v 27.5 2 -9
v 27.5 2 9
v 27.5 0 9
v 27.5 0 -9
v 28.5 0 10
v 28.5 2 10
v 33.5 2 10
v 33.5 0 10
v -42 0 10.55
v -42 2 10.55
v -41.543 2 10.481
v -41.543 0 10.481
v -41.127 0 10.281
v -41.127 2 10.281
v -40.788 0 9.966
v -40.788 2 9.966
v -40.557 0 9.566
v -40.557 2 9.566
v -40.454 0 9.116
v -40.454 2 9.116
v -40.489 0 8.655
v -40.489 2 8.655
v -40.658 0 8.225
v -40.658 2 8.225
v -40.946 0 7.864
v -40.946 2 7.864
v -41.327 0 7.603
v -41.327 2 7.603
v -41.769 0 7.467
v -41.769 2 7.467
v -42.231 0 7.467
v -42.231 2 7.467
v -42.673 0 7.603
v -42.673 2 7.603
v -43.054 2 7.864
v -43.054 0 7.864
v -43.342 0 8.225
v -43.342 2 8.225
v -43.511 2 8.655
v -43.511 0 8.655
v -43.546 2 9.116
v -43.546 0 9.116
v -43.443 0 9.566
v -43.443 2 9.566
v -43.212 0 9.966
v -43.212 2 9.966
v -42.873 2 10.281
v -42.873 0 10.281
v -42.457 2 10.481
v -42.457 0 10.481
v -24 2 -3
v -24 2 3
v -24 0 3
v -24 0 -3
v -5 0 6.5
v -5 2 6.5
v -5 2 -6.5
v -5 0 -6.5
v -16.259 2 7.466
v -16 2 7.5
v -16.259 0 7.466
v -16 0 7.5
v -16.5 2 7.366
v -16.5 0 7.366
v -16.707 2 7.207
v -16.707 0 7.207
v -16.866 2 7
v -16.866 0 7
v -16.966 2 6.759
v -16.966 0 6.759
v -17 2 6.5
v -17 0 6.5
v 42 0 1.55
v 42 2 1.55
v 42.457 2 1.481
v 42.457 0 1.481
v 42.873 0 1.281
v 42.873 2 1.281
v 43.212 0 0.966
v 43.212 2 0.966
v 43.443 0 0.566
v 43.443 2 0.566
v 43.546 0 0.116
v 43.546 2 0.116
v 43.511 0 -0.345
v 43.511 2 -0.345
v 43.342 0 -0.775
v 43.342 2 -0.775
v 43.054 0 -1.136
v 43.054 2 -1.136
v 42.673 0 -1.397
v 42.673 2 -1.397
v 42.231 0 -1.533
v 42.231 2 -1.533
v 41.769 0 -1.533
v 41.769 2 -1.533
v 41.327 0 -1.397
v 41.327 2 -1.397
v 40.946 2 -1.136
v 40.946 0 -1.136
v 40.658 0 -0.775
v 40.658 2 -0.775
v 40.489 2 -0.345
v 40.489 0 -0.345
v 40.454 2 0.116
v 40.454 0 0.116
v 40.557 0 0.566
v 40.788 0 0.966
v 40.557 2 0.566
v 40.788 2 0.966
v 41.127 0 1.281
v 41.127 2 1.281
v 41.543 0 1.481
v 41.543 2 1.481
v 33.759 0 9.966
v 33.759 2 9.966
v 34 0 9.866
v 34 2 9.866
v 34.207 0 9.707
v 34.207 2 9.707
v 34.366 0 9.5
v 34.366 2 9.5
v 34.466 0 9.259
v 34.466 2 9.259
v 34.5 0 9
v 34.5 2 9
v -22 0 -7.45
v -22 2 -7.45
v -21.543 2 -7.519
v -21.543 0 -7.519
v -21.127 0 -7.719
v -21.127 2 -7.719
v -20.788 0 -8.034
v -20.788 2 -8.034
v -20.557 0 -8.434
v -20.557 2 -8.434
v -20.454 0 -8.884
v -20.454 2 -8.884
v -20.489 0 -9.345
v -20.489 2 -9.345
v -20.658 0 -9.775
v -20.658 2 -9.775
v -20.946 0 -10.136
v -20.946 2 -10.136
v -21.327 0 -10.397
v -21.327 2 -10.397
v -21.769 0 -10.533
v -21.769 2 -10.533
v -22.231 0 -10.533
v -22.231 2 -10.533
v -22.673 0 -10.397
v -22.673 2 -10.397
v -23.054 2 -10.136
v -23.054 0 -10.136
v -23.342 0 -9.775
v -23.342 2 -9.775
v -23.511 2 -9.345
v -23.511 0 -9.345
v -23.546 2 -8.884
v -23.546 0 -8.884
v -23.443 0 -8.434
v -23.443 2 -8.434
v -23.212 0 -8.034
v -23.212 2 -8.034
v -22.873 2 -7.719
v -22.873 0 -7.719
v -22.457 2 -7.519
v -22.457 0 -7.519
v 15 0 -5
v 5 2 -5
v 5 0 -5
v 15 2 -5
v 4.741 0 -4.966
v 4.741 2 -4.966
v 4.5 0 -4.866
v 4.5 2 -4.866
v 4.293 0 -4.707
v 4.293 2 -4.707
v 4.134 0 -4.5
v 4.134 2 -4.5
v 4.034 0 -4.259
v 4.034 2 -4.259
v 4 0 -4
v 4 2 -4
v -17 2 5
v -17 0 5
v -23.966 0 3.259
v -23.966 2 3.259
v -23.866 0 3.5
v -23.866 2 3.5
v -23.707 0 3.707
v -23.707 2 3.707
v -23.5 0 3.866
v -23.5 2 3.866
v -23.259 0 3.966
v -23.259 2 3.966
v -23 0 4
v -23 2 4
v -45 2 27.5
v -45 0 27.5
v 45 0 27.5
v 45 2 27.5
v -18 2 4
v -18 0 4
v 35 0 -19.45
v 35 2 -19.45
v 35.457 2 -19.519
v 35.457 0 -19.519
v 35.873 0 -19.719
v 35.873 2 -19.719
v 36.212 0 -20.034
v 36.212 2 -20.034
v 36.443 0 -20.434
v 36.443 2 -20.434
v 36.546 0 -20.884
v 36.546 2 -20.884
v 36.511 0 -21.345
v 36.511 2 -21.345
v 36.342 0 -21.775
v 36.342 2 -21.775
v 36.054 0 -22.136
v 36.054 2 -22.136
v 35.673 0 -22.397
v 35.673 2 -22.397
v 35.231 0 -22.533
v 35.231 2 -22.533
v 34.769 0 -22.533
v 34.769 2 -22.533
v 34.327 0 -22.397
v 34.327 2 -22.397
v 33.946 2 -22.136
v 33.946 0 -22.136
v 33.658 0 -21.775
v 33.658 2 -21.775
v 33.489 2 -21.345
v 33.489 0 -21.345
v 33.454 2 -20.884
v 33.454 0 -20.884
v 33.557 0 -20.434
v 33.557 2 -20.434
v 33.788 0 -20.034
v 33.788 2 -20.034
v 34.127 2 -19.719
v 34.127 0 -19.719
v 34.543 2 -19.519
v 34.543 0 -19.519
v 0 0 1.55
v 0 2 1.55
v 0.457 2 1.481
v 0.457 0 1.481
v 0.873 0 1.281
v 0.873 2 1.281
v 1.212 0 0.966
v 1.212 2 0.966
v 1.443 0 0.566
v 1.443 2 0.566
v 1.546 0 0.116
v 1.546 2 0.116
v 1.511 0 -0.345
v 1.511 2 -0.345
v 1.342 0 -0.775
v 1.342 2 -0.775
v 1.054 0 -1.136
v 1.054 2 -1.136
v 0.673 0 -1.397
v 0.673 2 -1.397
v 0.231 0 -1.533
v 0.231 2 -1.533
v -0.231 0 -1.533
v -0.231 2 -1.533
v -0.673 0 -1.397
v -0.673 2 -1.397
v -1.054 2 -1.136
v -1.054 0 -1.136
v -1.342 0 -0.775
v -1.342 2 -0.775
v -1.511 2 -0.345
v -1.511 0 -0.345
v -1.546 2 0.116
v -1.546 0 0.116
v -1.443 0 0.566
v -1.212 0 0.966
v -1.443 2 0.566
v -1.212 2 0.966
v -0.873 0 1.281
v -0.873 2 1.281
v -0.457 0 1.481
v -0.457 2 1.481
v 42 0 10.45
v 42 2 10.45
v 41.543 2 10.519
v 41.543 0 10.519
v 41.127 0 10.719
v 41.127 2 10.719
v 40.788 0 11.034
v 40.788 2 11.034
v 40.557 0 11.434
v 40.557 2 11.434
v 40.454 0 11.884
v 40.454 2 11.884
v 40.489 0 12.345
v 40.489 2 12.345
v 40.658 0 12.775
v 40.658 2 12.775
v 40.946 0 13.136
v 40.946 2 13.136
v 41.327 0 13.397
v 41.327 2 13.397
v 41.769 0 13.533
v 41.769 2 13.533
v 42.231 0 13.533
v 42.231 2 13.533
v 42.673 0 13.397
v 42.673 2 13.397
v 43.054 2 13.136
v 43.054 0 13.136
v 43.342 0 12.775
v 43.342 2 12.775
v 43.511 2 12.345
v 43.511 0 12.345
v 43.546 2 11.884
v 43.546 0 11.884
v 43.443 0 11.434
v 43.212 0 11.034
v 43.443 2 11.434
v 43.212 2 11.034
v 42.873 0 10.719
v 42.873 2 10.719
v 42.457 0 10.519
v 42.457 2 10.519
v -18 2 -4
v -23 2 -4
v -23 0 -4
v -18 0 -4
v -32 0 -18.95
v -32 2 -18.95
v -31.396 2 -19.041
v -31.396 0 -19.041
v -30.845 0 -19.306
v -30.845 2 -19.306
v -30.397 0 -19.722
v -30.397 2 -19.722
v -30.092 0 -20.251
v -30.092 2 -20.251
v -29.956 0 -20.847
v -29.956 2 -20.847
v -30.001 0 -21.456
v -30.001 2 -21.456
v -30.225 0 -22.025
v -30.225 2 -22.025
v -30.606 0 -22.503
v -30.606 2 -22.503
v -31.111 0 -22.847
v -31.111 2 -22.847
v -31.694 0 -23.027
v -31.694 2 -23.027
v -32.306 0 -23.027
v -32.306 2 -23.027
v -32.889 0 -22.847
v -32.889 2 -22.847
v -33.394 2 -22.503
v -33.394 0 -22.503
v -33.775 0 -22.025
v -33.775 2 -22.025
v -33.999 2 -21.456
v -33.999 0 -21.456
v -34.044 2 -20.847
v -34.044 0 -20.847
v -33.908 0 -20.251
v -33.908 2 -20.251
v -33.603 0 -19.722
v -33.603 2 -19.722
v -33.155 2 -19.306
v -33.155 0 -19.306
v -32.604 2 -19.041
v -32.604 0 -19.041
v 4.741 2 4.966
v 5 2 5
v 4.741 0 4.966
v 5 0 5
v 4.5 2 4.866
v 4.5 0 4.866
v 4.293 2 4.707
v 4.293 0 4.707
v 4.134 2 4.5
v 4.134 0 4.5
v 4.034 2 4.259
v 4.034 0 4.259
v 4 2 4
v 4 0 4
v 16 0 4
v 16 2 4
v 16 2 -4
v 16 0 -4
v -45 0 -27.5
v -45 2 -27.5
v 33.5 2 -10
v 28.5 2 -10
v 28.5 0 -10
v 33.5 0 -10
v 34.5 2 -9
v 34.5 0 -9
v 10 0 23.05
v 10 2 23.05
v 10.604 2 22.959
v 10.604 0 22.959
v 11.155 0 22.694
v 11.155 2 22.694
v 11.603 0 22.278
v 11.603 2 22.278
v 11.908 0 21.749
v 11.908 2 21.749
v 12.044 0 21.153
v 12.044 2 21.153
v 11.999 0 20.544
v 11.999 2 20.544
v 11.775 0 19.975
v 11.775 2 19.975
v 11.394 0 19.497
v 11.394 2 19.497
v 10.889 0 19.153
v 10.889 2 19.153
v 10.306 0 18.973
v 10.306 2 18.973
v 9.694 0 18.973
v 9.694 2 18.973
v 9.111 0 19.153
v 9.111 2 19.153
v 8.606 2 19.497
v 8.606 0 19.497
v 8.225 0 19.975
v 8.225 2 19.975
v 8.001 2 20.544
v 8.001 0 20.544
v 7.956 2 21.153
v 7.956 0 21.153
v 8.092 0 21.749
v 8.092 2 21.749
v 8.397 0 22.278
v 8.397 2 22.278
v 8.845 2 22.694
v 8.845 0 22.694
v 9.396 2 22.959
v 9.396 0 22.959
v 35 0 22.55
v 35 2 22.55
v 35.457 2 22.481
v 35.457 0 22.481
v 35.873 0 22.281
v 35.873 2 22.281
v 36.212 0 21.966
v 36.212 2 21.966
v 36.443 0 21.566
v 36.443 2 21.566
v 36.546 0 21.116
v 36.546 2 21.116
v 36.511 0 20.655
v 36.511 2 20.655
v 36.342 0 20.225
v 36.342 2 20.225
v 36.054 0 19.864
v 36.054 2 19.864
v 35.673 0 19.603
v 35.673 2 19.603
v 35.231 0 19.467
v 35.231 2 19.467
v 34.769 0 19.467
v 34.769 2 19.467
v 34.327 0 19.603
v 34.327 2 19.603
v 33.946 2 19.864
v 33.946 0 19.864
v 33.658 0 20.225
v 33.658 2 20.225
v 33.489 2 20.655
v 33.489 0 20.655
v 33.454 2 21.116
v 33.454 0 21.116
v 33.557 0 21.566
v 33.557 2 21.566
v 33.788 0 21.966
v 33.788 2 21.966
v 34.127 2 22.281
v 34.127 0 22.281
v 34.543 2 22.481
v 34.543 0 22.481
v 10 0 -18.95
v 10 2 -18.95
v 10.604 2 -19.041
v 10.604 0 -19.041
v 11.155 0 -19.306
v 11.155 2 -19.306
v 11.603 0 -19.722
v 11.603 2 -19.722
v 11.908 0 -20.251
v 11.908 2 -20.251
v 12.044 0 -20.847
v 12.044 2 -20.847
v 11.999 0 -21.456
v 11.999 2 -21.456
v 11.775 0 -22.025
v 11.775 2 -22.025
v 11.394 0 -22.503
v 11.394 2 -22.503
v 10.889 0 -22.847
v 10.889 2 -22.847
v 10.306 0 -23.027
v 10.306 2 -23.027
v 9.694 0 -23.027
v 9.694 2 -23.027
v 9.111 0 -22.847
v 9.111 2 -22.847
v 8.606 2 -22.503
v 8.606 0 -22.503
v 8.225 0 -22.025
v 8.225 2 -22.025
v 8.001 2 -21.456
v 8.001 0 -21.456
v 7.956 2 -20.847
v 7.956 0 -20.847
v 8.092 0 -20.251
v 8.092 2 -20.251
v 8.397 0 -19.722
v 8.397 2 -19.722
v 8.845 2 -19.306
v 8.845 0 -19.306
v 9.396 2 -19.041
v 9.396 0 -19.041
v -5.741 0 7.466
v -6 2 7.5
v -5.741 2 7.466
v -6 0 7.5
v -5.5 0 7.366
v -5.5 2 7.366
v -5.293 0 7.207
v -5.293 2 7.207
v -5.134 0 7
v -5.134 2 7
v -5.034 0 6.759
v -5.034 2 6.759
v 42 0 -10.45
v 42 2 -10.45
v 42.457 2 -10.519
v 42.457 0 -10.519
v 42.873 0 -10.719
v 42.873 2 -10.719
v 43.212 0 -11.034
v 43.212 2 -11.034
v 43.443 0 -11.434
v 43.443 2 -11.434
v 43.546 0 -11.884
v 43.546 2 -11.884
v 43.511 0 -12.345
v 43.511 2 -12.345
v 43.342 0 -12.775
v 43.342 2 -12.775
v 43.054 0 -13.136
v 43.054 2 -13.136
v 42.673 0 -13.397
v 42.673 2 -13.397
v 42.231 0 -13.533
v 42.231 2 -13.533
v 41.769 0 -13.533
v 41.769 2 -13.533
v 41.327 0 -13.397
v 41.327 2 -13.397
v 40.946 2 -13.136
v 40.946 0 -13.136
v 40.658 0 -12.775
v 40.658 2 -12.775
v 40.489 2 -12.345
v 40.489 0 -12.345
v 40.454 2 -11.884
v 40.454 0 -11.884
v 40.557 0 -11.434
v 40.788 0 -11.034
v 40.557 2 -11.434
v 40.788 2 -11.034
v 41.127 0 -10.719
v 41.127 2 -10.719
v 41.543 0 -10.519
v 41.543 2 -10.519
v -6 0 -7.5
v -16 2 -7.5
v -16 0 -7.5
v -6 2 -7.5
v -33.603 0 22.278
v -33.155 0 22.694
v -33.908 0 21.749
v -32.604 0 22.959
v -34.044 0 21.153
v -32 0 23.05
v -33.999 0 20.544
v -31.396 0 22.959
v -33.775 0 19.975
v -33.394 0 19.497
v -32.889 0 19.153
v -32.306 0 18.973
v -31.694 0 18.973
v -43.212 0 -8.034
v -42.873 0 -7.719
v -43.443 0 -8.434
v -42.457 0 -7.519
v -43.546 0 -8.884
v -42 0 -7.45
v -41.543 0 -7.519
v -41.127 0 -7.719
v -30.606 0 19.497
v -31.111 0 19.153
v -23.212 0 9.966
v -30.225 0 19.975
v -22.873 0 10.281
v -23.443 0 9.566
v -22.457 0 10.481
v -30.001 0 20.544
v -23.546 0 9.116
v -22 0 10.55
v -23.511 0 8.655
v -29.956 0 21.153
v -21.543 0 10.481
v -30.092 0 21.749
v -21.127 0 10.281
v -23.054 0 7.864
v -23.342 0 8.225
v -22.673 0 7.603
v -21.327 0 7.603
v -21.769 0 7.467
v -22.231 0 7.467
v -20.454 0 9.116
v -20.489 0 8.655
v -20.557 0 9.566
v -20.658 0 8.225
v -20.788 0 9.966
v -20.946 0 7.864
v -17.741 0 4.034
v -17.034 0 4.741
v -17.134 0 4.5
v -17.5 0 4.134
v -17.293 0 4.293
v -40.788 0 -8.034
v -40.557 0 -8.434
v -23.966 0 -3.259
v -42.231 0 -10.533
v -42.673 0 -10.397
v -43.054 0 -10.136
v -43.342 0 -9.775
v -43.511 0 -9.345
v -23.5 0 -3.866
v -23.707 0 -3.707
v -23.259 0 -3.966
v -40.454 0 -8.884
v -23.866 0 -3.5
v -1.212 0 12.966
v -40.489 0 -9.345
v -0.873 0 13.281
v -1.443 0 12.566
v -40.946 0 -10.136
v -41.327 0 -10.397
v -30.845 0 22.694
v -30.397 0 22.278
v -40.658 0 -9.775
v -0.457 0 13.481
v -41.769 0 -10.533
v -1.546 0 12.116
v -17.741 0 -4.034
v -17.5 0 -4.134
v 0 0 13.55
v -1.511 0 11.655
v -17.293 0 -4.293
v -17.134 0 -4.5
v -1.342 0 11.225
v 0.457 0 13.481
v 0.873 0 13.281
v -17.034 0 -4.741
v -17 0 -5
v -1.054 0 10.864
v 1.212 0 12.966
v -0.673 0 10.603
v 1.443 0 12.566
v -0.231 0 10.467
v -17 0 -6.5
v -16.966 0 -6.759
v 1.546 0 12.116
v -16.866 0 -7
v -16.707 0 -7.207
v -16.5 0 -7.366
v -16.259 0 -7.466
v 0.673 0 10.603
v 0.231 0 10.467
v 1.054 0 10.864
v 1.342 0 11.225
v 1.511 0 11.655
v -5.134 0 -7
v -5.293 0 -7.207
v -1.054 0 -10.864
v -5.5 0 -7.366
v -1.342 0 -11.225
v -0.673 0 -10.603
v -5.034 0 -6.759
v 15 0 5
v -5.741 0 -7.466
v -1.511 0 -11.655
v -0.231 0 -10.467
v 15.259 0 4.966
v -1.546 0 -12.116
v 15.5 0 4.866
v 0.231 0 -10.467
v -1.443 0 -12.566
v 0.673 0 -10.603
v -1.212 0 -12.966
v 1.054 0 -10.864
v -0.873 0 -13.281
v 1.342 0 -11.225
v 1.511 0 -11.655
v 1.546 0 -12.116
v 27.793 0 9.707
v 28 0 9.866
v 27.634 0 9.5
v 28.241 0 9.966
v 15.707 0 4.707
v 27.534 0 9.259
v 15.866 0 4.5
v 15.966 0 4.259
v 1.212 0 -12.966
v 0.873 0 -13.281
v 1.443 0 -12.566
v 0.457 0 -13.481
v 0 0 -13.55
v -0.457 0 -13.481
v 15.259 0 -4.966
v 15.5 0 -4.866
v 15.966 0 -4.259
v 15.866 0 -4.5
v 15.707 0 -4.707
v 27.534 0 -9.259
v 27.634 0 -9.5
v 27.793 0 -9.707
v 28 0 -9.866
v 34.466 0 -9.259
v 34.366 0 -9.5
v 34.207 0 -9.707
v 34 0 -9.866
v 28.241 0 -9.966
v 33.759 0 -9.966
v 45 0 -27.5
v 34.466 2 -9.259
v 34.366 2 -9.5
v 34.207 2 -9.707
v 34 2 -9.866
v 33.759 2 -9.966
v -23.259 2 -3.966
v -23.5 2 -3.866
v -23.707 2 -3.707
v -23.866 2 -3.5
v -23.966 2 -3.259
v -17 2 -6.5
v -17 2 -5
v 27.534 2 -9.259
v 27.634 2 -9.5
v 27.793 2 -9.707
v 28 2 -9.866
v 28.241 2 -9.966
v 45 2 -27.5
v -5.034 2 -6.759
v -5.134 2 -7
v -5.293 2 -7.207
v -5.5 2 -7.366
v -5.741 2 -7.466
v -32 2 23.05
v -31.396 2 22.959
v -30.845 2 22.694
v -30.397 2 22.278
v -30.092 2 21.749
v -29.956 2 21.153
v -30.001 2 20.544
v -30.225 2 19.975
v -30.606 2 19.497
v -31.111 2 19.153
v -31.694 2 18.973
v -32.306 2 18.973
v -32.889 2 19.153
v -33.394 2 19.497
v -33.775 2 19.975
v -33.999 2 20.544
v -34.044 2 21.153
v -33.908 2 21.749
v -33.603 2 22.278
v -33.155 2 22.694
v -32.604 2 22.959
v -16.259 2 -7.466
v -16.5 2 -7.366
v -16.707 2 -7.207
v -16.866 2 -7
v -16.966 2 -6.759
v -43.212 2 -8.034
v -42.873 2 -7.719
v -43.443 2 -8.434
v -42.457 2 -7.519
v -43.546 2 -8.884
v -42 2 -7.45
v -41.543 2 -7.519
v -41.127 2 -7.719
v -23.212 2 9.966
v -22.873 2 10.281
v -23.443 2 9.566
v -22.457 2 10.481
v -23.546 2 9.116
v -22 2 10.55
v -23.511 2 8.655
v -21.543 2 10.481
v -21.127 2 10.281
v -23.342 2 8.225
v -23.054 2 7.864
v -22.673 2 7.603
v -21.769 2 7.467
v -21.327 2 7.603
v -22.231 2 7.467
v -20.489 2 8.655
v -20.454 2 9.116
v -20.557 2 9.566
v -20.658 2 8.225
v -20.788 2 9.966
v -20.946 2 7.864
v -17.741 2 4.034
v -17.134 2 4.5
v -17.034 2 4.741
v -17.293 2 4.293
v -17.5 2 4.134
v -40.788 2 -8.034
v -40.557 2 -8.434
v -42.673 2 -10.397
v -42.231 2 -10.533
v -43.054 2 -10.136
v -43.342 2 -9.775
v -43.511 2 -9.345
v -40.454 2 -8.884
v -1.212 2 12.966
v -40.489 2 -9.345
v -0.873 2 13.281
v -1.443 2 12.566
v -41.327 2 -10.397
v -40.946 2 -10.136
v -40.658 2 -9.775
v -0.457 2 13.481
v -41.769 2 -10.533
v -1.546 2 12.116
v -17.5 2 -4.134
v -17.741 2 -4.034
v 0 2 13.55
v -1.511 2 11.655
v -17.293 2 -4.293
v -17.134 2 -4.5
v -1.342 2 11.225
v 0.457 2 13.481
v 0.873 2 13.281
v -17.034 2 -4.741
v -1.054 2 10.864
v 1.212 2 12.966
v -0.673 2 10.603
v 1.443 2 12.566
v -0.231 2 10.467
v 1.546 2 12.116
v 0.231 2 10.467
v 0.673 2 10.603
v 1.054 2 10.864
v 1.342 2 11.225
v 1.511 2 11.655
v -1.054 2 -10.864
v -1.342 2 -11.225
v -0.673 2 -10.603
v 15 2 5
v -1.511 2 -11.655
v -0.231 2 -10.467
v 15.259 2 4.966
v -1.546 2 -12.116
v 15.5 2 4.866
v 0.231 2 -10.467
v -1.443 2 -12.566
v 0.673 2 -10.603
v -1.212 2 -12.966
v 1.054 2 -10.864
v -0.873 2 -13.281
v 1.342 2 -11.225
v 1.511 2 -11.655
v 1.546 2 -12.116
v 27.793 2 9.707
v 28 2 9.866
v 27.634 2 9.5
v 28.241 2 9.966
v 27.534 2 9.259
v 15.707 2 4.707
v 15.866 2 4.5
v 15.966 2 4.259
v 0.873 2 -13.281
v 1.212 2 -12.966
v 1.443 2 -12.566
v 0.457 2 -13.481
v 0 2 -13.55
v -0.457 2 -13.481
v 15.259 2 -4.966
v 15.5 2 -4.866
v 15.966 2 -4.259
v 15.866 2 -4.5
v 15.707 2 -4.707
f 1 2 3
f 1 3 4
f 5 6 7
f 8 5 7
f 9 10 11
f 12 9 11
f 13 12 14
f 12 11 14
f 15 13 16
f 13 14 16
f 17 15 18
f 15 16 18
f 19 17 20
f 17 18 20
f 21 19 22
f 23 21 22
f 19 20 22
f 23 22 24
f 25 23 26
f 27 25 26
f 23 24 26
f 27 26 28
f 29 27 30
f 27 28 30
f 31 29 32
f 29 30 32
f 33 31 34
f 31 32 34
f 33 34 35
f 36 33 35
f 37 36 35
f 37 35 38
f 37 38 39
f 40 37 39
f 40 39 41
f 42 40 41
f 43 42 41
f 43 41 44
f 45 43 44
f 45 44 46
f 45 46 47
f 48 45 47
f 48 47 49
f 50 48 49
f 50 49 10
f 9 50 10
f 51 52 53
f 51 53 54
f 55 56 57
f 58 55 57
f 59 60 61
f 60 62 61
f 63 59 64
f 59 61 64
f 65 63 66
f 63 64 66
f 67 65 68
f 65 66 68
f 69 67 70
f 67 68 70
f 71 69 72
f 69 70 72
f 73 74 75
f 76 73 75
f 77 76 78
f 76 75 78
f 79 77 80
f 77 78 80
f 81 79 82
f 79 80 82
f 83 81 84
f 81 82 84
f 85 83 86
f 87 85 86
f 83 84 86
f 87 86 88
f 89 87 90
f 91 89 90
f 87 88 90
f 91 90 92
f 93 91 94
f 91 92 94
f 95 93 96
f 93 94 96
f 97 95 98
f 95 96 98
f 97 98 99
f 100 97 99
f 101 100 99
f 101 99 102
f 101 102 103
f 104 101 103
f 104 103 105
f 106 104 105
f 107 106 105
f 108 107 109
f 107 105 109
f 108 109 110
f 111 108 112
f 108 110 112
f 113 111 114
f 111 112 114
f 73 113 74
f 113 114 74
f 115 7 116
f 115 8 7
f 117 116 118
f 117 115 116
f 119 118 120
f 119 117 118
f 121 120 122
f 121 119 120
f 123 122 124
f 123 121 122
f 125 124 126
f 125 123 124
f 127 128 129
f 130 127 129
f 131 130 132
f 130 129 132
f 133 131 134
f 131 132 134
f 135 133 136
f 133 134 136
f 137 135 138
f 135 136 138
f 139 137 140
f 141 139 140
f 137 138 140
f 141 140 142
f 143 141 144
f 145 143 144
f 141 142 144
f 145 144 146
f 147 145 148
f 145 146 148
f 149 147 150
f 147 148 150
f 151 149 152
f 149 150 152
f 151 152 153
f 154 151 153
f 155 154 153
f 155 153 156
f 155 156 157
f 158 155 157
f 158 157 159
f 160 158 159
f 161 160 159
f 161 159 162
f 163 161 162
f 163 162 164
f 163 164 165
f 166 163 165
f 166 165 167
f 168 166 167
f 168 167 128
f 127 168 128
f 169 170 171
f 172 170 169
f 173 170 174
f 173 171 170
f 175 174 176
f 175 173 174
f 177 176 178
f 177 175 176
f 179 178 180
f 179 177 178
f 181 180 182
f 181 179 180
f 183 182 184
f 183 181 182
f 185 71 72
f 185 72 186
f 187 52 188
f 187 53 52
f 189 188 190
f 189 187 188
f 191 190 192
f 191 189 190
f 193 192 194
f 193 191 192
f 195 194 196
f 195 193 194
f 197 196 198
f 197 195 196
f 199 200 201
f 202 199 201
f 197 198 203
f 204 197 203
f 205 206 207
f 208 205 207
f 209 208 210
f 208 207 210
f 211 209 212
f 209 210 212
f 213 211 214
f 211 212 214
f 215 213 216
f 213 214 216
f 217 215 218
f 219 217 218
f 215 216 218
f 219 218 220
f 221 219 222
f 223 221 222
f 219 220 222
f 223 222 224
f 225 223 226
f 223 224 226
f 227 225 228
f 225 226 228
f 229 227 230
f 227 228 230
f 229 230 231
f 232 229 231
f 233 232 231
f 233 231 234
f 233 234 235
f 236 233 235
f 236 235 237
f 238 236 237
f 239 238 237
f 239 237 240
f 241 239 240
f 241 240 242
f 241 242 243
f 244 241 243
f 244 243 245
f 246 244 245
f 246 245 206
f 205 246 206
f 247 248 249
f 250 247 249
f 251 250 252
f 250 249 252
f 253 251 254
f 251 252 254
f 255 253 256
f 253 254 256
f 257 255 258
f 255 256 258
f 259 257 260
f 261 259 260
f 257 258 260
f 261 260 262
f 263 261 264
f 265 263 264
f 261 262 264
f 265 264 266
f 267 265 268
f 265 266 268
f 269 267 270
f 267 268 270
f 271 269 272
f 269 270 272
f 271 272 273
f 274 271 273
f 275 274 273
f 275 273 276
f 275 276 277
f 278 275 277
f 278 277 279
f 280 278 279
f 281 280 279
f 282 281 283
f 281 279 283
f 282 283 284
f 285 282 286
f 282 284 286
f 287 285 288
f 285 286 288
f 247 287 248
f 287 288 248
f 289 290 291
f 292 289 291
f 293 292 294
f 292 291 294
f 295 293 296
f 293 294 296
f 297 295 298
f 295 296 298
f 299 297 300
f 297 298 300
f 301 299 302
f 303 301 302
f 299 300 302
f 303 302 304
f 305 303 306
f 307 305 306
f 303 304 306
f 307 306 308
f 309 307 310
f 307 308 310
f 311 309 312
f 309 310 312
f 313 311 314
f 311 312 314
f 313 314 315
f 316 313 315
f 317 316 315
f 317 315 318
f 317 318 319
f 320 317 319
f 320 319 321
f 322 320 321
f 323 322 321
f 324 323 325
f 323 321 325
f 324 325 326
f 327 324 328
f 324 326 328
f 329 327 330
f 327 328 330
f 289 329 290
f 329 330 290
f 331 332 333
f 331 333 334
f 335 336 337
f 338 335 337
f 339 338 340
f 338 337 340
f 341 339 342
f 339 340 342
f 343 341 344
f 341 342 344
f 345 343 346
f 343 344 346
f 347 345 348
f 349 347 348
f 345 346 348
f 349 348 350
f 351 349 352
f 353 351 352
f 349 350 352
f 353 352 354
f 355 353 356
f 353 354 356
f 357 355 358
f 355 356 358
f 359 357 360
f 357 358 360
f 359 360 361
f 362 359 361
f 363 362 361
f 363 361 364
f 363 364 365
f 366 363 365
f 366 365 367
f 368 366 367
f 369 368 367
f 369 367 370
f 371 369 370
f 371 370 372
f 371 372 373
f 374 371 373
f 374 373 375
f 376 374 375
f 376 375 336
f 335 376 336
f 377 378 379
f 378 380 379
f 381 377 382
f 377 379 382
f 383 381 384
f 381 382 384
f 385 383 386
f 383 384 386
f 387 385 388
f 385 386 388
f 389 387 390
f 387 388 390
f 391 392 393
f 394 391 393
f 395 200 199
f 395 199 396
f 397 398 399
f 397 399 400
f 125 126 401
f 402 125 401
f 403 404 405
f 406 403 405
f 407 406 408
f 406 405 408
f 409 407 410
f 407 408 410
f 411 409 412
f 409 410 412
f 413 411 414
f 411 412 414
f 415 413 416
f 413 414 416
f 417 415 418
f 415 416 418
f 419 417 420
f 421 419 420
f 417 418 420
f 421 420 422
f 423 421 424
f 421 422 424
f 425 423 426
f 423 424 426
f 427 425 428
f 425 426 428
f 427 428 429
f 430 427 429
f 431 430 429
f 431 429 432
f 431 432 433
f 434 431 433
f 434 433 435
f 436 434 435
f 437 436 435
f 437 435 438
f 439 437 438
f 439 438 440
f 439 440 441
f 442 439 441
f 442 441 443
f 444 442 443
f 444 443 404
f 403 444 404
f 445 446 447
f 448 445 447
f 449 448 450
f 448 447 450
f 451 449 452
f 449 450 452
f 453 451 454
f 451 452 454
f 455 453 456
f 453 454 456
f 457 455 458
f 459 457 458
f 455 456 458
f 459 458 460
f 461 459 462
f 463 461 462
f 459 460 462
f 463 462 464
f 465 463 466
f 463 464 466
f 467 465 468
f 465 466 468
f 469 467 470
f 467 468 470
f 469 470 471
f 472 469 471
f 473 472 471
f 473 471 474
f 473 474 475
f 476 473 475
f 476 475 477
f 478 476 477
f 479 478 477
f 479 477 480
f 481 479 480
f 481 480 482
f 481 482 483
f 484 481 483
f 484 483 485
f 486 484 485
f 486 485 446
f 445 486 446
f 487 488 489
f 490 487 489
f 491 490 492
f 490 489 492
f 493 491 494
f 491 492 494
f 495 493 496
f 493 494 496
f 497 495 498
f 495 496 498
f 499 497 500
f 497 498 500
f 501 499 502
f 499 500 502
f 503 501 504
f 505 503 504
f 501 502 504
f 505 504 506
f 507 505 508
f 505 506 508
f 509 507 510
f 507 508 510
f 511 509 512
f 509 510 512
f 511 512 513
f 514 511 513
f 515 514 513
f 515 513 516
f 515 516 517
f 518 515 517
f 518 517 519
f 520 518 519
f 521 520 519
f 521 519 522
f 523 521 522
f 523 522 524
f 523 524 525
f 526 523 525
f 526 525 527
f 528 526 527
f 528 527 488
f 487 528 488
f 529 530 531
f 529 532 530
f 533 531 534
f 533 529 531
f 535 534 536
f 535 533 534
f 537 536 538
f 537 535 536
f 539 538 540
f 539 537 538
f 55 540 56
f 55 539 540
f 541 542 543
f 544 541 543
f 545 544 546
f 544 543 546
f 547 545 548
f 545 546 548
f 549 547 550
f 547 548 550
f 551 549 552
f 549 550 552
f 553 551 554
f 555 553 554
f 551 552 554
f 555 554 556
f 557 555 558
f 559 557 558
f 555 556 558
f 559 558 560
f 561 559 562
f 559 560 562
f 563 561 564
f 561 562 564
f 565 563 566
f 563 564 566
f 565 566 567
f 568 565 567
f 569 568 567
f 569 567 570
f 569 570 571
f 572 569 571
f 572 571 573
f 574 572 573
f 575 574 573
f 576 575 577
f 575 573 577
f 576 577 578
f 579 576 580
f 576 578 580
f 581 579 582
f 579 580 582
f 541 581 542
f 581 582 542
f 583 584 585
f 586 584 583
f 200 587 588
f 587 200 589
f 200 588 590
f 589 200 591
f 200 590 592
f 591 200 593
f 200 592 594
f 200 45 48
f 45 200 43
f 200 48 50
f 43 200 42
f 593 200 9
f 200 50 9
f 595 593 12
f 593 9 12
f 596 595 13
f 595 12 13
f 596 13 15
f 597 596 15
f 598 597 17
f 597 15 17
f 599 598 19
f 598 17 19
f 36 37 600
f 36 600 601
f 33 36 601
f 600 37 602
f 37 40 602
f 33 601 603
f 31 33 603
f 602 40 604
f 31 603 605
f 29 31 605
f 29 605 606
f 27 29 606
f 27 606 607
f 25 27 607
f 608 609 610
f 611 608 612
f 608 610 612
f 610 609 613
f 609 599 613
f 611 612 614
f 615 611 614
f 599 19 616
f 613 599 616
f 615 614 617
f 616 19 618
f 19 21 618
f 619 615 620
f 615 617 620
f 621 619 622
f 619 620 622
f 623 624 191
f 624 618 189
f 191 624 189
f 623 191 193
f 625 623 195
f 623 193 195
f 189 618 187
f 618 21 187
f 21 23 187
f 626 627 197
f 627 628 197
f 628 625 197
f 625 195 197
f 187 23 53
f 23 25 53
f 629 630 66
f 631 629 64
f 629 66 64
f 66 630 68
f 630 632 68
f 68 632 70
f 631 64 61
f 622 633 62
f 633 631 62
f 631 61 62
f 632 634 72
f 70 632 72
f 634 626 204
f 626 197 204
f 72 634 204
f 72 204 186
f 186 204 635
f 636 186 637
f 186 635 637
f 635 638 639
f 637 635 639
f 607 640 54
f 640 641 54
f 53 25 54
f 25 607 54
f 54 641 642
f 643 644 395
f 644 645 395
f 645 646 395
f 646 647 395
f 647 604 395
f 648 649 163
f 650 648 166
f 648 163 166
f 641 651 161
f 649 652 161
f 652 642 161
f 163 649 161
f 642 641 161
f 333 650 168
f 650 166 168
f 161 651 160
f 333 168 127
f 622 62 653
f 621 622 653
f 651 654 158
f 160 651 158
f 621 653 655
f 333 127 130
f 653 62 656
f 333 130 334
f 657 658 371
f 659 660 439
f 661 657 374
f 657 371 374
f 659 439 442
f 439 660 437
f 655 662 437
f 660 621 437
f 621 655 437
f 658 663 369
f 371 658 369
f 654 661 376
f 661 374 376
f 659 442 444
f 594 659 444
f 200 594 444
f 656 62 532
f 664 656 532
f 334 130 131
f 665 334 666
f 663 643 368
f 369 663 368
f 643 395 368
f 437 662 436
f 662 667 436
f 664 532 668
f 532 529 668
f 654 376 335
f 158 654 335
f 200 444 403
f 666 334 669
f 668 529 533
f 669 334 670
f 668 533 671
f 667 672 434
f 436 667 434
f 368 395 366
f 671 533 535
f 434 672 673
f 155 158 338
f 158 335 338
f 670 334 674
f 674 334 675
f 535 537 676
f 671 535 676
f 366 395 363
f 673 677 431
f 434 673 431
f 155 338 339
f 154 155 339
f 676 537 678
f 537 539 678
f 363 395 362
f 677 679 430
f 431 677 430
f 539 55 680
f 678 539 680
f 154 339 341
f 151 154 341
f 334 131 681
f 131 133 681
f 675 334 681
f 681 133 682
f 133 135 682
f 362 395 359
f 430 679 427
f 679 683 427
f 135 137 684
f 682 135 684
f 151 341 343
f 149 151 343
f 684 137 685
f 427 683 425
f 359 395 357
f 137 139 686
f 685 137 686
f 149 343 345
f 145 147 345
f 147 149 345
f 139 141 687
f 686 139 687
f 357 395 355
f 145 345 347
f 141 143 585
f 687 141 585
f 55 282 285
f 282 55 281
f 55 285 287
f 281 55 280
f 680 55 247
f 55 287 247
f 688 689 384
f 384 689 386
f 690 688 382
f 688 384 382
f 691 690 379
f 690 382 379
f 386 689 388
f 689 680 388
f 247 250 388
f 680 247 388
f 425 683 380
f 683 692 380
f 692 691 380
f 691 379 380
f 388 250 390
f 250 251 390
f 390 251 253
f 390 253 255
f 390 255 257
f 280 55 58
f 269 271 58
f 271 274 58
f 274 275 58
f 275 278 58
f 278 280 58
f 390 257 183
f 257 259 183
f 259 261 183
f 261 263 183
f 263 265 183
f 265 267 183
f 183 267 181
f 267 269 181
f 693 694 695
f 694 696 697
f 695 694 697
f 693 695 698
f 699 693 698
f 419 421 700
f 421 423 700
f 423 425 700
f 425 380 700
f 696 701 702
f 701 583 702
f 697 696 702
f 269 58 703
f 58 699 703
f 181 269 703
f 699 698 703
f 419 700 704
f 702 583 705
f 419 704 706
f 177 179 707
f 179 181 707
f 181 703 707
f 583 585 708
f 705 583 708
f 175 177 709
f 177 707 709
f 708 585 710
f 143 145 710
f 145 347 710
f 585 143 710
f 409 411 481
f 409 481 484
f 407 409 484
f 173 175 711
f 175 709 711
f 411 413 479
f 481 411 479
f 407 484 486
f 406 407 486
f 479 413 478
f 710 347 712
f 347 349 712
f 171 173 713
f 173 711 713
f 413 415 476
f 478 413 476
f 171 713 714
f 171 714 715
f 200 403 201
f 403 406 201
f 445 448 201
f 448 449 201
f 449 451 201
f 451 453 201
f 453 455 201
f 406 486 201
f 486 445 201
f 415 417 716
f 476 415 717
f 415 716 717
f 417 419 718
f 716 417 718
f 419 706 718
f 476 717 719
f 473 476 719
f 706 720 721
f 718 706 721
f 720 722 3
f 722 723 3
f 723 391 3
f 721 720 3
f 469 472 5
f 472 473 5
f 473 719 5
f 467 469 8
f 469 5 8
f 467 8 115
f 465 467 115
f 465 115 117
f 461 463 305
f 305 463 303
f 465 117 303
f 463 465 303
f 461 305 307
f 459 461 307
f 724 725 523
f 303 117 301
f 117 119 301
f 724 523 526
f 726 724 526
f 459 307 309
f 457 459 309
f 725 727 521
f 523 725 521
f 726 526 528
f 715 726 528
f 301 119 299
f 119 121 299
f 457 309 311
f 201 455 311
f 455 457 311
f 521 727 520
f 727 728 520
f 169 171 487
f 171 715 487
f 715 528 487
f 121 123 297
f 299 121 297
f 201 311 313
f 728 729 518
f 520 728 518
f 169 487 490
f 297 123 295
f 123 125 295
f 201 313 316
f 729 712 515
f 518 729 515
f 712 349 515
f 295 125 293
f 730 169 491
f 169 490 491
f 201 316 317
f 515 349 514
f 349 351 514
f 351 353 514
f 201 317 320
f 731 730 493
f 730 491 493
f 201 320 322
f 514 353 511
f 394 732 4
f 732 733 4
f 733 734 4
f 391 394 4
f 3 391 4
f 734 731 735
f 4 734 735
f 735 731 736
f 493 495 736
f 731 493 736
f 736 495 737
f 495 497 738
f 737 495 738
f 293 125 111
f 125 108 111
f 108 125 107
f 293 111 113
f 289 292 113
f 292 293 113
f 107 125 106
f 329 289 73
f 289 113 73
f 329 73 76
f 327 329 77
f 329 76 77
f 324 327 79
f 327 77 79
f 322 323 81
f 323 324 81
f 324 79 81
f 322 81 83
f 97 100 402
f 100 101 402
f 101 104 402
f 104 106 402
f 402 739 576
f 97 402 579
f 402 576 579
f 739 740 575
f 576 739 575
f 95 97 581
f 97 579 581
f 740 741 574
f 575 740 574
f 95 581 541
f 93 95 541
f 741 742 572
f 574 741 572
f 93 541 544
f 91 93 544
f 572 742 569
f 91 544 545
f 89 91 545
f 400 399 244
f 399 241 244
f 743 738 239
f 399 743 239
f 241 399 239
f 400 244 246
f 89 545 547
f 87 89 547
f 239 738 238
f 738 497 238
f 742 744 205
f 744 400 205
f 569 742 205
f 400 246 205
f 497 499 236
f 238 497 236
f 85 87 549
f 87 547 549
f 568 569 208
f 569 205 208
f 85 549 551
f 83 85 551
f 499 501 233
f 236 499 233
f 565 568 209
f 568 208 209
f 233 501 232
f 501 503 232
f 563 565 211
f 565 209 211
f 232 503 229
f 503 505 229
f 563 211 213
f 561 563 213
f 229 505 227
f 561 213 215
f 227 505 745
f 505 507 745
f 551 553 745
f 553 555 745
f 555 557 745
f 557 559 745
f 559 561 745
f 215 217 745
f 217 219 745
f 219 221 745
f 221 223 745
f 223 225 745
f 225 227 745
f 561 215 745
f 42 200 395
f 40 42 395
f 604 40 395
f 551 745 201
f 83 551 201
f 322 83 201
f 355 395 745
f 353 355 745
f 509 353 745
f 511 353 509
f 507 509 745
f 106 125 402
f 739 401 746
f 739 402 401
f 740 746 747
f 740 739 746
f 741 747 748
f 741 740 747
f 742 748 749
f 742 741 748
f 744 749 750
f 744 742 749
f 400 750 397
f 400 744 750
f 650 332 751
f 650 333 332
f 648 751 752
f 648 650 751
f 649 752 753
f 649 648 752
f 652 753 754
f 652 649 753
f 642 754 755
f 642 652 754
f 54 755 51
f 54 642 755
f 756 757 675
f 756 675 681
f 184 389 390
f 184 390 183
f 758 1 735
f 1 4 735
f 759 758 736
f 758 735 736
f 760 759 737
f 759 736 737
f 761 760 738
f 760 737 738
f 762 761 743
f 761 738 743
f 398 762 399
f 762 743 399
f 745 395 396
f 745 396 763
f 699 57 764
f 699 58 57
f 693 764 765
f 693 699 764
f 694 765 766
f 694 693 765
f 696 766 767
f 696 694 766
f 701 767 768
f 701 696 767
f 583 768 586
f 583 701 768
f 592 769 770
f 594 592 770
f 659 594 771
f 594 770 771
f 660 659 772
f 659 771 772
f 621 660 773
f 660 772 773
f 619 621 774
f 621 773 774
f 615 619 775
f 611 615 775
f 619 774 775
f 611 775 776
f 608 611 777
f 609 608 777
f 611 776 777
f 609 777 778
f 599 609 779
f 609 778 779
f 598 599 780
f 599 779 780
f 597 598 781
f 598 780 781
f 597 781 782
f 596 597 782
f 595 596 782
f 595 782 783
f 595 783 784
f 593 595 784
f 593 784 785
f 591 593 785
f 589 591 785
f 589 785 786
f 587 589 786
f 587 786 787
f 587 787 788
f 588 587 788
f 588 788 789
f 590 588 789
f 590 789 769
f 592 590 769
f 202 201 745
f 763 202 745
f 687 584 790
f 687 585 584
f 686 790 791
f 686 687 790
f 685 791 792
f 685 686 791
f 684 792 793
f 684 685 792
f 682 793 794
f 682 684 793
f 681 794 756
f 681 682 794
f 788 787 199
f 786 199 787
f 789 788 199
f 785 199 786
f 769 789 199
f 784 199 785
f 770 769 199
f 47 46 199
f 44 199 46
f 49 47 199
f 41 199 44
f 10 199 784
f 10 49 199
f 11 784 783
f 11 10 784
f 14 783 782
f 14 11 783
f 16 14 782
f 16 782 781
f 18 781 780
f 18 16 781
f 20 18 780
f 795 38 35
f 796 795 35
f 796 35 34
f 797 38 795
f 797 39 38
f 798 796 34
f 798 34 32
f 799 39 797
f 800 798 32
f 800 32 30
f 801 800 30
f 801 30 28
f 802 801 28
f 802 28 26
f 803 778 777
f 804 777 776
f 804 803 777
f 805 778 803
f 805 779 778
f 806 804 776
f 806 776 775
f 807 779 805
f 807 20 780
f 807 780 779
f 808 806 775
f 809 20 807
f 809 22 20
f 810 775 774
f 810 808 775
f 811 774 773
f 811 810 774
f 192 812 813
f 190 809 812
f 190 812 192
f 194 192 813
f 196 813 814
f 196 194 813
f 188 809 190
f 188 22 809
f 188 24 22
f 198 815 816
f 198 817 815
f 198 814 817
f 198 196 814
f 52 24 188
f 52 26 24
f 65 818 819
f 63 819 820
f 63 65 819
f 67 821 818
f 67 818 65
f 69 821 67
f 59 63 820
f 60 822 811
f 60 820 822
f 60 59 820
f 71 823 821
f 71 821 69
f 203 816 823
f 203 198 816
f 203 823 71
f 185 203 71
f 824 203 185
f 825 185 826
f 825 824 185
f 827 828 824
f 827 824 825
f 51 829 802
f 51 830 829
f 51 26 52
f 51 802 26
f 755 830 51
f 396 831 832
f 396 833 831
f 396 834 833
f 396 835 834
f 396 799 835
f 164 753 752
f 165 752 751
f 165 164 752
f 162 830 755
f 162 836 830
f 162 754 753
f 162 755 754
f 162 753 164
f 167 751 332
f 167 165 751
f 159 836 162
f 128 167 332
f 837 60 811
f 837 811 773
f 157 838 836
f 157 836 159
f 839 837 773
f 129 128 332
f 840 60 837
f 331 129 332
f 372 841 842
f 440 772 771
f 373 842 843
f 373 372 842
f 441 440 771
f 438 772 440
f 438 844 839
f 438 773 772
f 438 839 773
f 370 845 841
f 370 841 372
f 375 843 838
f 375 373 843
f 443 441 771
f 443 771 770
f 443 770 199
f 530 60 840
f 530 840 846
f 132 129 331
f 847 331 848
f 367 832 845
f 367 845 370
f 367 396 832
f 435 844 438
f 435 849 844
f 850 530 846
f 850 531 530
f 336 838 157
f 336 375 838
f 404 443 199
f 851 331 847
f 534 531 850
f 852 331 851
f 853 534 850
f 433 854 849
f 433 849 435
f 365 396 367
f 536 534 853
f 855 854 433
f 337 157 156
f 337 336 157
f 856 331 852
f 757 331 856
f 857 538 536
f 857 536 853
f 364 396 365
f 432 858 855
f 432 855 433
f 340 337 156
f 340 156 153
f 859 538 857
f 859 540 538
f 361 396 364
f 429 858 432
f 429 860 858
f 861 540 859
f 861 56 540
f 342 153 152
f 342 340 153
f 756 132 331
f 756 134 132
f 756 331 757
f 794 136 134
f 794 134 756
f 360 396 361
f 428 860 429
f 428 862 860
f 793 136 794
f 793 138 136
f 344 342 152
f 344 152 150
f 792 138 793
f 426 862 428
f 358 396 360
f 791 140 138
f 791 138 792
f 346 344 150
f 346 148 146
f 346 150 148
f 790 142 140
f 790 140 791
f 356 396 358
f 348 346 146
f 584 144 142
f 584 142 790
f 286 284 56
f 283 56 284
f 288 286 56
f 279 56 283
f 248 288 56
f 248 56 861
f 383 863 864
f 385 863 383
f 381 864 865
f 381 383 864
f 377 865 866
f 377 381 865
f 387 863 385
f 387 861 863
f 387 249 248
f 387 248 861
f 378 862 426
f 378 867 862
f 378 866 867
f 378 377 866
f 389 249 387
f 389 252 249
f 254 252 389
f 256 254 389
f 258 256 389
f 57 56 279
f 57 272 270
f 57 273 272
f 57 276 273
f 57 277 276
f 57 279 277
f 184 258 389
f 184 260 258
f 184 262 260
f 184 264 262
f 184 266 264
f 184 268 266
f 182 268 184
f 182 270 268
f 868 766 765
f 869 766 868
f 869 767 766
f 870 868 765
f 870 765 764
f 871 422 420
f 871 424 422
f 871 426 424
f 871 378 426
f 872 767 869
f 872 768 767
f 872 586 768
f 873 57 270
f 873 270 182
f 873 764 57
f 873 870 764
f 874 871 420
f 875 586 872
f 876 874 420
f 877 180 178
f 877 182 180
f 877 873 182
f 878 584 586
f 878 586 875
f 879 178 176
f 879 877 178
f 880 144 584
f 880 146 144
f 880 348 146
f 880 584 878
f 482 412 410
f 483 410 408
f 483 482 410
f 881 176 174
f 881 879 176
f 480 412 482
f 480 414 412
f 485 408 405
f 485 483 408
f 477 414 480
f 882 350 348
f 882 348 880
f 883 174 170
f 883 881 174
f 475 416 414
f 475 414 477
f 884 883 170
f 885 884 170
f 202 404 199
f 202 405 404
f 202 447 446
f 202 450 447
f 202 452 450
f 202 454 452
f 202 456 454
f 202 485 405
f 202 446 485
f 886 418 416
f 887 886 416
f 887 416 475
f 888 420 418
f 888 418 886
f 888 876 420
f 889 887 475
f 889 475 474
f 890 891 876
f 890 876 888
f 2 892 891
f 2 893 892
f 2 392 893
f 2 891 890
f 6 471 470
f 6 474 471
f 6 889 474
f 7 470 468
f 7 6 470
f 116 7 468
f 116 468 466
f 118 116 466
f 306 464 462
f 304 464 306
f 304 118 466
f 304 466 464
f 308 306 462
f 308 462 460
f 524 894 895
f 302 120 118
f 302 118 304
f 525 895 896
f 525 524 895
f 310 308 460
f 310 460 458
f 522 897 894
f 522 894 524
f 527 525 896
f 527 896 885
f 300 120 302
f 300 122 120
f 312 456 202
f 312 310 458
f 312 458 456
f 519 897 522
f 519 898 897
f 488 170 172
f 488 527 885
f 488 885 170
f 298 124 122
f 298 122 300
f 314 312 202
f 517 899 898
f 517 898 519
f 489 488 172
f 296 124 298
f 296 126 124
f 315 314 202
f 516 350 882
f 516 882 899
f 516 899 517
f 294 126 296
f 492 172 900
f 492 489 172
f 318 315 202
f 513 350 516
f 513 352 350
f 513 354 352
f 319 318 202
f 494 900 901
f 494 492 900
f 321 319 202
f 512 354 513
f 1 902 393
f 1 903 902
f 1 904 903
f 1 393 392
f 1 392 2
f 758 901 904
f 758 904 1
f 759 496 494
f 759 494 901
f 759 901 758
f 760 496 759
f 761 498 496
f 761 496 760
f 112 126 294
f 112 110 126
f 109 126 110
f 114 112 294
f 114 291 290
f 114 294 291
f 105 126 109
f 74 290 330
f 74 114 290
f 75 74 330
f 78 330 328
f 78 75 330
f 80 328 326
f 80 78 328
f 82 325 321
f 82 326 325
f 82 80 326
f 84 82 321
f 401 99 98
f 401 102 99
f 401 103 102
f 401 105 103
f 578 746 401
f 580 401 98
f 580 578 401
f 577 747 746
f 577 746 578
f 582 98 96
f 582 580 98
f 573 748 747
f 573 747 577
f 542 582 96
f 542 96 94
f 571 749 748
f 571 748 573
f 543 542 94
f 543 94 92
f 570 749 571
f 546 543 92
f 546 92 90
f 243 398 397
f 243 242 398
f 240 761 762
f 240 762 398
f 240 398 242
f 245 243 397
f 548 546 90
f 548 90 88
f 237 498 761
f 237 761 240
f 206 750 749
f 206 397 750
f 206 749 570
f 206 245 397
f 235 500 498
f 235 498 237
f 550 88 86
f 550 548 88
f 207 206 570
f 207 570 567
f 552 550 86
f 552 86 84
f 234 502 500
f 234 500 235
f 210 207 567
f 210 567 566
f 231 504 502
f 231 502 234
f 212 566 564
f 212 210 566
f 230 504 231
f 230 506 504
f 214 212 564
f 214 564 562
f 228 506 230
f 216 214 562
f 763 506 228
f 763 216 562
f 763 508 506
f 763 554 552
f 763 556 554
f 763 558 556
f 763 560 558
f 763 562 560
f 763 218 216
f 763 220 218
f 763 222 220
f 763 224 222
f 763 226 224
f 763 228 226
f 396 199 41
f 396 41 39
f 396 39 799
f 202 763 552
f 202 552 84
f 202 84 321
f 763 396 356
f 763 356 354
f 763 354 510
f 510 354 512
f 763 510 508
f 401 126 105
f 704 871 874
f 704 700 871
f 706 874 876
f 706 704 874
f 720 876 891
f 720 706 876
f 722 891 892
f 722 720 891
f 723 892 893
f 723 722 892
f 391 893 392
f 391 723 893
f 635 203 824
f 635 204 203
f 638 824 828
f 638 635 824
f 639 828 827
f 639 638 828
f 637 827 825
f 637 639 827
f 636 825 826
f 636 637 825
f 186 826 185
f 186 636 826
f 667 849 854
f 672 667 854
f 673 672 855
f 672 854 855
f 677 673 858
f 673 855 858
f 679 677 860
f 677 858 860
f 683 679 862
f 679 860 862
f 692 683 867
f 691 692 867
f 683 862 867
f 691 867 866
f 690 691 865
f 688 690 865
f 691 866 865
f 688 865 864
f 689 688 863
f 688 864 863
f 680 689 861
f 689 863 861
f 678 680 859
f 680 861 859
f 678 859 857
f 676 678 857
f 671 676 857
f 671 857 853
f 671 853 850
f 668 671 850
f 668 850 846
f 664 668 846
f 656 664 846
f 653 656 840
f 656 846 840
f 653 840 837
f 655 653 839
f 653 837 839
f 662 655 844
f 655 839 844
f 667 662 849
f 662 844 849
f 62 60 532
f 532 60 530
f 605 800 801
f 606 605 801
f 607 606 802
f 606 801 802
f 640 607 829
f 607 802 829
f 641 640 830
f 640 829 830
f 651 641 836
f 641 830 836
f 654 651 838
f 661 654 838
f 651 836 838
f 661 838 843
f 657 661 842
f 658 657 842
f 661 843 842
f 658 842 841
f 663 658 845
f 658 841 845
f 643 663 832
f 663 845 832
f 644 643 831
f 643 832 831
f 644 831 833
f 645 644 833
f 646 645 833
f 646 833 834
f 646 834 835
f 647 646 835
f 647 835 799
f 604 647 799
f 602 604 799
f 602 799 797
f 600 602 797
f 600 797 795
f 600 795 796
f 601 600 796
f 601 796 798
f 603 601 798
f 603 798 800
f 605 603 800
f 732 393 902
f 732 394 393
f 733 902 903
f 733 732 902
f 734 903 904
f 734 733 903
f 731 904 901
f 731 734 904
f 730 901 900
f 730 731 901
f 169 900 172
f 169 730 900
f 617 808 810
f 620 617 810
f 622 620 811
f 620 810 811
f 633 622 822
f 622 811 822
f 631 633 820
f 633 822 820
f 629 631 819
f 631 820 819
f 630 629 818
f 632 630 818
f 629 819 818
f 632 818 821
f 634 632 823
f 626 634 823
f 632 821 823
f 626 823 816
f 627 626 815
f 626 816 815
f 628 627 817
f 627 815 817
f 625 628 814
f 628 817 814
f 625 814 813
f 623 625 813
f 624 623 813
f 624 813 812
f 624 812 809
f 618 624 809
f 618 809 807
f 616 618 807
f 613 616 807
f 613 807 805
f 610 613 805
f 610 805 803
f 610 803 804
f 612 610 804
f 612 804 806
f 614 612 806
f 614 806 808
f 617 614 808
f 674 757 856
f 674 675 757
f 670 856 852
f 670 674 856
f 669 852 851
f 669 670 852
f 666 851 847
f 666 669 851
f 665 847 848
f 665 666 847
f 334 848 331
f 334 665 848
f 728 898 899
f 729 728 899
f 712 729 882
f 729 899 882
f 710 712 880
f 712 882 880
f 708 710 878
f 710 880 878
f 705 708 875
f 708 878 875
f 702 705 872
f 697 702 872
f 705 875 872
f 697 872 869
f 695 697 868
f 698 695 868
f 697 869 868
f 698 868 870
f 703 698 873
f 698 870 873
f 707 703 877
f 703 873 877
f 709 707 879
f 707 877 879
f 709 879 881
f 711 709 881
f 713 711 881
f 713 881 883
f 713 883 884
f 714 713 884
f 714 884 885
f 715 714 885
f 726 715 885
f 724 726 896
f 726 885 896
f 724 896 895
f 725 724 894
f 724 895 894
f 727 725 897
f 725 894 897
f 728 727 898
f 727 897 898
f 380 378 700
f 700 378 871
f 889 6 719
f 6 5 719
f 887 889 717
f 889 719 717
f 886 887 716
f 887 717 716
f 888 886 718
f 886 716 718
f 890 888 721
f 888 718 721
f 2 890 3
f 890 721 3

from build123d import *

# Parameters (mm, degrees)
SKETCH_1_W          = 90
SKETCH_1_H          = 55
EXTRUDE_1_DEPTH     = 2
SKETCH_2_R          = 1.55
CUT_EXTRUDE_1_DEPTH = 2
SKETCH_3_R          = 1.55
CUT_EXTRUDE_2_DEPTH = 10
SKETCH_4_R          = 2.05
CUT_EXTRUDE_3_DEPTH = 10
SKETCH_5_R          = 1.55
CUT_EXTRUDE_4_DEPTH = 10
SKETCH_6_W          = 7
SKETCH_6_H          = 20
CUT_EXTRUDE_5_DEPTH = 10
SKETCH_7_W          = 12
SKETCH_7_H          = 15
CUT_EXTRUDE_6_DEPTH = 10
SKETCH_8_W          = 7
SKETCH_8_H          = 8
SKETCH_8_W_2        = 12
SKETCH_8_H_2        = 10
CUT_EXTRUDE_7_DEPTH = 10
FILLET_1_R          = 1


with BuildPart() as part:
    # 草图1 → 凸台-拉伸1 (new body)
    with BuildSketch(Plane(origin=(0, 0, 0), x_dir=(1, 0, 0), z_dir=(0, 1, 0))):
        Rectangle(SKETCH_1_W, SKETCH_1_H)
    extrude(amount=EXTRUDE_1_DEPTH)

    # 草图2 → 切除-拉伸1 (cut)
    with BuildSketch(Plane(origin=(0, 2, 0), x_dir=(1, 0, 0), z_dir=(0, 1, 0))):
        with Locations(Location((0, -12, 0), (0, 0, 270))):
            Circle(SKETCH_2_R)
        with Locations(Location((0, 12, 0), (0, 0, 90))):
            Circle(SKETCH_2_R)
        with Locations(Location((0, 0, 0), (0, 0, 270))):
            Circle(SKETCH_2_R)
        with Locations(Location((42, 12, 0), (0, 0, 270))):
            Circle(SKETCH_2_R)
        with Locations(Location((42, 0, 0), (0, 0, 270))):
            Circle(SKETCH_2_R)
        with Locations(Location((42, -12, 0), (0, 0, 90))):
            Circle(SKETCH_2_R)
    extrude(amount=-CUT_EXTRUDE_1_DEPTH, mode=Mode.SUBTRACT)

    # 草图3 → 切除-拉伸2 (cut)
    with BuildSketch(Plane(origin=(0, 2, 0), x_dir=(1, 0, 0), z_dir=(0, 1, 0))):
        with Locations(Location((35, 21, 0), (0, 0, 270))):
            Circle(SKETCH_3_R)
        with Locations(Location((35, -21, 0), (0, 0, 270))):
            Circle(SKETCH_3_R)
    extrude(amount=-CUT_EXTRUDE_2_DEPTH, mode=Mode.SUBTRACT)

    # 草图4 → 切除-拉伸3 (cut)
    with BuildSketch(Plane(origin=(0, 2, 0), x_dir=(1, 0, 0), z_dir=(0, 1, 0))):
        with Locations(Location((-32, 21, 0), (0, 0, 270))):
            Circle(SKETCH_4_R)
        with Locations(Location((-32, -21, 0), (0, 0, 270))):
            Circle(SKETCH_4_R)
        with Locations(Location((10, 21, 0), (0, 0, 270))):
            Circle(SKETCH_4_R)
        with Locations(Location((10, -21, 0), (0, 0, 270))):
            Circle(SKETCH_4_R)
    extrude(amount=-CUT_EXTRUDE_3_DEPTH, mode=Mode.SUBTRACT)

    # 草图5 → 切除-拉伸4 (cut)
    with BuildSketch(Plane(origin=(0, 2, 0), x_dir=(1, 0, 0), z_dir=(0, 1, 0))):
        with Locations(Location((-42, 9, 0), (0, 0, 270))):
            Circle(SKETCH_5_R)
        with Locations(Location((-42, -9, 0), (0, 0, 270))):
            Circle(SKETCH_5_R)
        with Locations(Location((-22, -9, 0), (0, 0, 270))):
            Circle(SKETCH_5_R)
        with Locations(Location((-22, 9, 0), (0, 0, 270))):
            Circle(SKETCH_5_R)
    extrude(amount=-CUT_EXTRUDE_4_DEPTH, mode=Mode.SUBTRACT)

    # 草图6 → 切除-拉伸5 (cut)
    with BuildSketch(Plane(origin=(0, 2, 0), x_dir=(1, 0, 0), z_dir=(0, 1, 0))):
        with Locations((31, 0)):
            Rectangle(SKETCH_6_W, SKETCH_6_H)
    extrude(amount=-CUT_EXTRUDE_5_DEPTH, mode=Mode.SUBTRACT)

    # 草图7 → 切除-拉伸6 (cut)
    with BuildSketch(Plane(origin=(0, 2, 0), x_dir=(1, 0, 0), z_dir=(0, 1, 0))):
        with Locations((-11, 0)):
            Rectangle(SKETCH_7_W, SKETCH_7_H)
    extrude(amount=-CUT_EXTRUDE_6_DEPTH, mode=Mode.SUBTRACT)

    # 草图8 → 切除-拉伸7 (cut)
    with BuildSketch(Plane(origin=(0, 2, 0), x_dir=(1, 0, 0), z_dir=(0, 1, 0))):
        with Locations((-20.5, 0)):
            Rectangle(SKETCH_8_W, SKETCH_8_H)
        with Locations((10, 0)):
            Rectangle(SKETCH_8_W_2, SKETCH_8_H_2)
    extrude(amount=-CUT_EXTRUDE_7_DEPTH, mode=Mode.SUBTRACT)

    # 圆角1
    fillet_1_edges = [part.edges().sort_by_distance(p)[0] for p in [
        (27.5, 1, 10),
        (27.5, 1, -10),
        (34.5, 1, -10),
        (34.5, 1, 10),
        (-5, 1, -7.5),
        (-5, 1, 7.5),
        (-17, 1, 7.5),
        (-17, 1, -7.5),
        (-17, 1, -4),
        (-17, 1, 4),
        (-24, 1, 4),
        (-24, 1, -4),
        (16, 1, -5),
        (16, 1, 5),
        (4, 1, 5),
        (4, 1, -5),
    ]]
    fillet(fillet_1_edges, radius=FILLET_1_R)


solid = part.part
